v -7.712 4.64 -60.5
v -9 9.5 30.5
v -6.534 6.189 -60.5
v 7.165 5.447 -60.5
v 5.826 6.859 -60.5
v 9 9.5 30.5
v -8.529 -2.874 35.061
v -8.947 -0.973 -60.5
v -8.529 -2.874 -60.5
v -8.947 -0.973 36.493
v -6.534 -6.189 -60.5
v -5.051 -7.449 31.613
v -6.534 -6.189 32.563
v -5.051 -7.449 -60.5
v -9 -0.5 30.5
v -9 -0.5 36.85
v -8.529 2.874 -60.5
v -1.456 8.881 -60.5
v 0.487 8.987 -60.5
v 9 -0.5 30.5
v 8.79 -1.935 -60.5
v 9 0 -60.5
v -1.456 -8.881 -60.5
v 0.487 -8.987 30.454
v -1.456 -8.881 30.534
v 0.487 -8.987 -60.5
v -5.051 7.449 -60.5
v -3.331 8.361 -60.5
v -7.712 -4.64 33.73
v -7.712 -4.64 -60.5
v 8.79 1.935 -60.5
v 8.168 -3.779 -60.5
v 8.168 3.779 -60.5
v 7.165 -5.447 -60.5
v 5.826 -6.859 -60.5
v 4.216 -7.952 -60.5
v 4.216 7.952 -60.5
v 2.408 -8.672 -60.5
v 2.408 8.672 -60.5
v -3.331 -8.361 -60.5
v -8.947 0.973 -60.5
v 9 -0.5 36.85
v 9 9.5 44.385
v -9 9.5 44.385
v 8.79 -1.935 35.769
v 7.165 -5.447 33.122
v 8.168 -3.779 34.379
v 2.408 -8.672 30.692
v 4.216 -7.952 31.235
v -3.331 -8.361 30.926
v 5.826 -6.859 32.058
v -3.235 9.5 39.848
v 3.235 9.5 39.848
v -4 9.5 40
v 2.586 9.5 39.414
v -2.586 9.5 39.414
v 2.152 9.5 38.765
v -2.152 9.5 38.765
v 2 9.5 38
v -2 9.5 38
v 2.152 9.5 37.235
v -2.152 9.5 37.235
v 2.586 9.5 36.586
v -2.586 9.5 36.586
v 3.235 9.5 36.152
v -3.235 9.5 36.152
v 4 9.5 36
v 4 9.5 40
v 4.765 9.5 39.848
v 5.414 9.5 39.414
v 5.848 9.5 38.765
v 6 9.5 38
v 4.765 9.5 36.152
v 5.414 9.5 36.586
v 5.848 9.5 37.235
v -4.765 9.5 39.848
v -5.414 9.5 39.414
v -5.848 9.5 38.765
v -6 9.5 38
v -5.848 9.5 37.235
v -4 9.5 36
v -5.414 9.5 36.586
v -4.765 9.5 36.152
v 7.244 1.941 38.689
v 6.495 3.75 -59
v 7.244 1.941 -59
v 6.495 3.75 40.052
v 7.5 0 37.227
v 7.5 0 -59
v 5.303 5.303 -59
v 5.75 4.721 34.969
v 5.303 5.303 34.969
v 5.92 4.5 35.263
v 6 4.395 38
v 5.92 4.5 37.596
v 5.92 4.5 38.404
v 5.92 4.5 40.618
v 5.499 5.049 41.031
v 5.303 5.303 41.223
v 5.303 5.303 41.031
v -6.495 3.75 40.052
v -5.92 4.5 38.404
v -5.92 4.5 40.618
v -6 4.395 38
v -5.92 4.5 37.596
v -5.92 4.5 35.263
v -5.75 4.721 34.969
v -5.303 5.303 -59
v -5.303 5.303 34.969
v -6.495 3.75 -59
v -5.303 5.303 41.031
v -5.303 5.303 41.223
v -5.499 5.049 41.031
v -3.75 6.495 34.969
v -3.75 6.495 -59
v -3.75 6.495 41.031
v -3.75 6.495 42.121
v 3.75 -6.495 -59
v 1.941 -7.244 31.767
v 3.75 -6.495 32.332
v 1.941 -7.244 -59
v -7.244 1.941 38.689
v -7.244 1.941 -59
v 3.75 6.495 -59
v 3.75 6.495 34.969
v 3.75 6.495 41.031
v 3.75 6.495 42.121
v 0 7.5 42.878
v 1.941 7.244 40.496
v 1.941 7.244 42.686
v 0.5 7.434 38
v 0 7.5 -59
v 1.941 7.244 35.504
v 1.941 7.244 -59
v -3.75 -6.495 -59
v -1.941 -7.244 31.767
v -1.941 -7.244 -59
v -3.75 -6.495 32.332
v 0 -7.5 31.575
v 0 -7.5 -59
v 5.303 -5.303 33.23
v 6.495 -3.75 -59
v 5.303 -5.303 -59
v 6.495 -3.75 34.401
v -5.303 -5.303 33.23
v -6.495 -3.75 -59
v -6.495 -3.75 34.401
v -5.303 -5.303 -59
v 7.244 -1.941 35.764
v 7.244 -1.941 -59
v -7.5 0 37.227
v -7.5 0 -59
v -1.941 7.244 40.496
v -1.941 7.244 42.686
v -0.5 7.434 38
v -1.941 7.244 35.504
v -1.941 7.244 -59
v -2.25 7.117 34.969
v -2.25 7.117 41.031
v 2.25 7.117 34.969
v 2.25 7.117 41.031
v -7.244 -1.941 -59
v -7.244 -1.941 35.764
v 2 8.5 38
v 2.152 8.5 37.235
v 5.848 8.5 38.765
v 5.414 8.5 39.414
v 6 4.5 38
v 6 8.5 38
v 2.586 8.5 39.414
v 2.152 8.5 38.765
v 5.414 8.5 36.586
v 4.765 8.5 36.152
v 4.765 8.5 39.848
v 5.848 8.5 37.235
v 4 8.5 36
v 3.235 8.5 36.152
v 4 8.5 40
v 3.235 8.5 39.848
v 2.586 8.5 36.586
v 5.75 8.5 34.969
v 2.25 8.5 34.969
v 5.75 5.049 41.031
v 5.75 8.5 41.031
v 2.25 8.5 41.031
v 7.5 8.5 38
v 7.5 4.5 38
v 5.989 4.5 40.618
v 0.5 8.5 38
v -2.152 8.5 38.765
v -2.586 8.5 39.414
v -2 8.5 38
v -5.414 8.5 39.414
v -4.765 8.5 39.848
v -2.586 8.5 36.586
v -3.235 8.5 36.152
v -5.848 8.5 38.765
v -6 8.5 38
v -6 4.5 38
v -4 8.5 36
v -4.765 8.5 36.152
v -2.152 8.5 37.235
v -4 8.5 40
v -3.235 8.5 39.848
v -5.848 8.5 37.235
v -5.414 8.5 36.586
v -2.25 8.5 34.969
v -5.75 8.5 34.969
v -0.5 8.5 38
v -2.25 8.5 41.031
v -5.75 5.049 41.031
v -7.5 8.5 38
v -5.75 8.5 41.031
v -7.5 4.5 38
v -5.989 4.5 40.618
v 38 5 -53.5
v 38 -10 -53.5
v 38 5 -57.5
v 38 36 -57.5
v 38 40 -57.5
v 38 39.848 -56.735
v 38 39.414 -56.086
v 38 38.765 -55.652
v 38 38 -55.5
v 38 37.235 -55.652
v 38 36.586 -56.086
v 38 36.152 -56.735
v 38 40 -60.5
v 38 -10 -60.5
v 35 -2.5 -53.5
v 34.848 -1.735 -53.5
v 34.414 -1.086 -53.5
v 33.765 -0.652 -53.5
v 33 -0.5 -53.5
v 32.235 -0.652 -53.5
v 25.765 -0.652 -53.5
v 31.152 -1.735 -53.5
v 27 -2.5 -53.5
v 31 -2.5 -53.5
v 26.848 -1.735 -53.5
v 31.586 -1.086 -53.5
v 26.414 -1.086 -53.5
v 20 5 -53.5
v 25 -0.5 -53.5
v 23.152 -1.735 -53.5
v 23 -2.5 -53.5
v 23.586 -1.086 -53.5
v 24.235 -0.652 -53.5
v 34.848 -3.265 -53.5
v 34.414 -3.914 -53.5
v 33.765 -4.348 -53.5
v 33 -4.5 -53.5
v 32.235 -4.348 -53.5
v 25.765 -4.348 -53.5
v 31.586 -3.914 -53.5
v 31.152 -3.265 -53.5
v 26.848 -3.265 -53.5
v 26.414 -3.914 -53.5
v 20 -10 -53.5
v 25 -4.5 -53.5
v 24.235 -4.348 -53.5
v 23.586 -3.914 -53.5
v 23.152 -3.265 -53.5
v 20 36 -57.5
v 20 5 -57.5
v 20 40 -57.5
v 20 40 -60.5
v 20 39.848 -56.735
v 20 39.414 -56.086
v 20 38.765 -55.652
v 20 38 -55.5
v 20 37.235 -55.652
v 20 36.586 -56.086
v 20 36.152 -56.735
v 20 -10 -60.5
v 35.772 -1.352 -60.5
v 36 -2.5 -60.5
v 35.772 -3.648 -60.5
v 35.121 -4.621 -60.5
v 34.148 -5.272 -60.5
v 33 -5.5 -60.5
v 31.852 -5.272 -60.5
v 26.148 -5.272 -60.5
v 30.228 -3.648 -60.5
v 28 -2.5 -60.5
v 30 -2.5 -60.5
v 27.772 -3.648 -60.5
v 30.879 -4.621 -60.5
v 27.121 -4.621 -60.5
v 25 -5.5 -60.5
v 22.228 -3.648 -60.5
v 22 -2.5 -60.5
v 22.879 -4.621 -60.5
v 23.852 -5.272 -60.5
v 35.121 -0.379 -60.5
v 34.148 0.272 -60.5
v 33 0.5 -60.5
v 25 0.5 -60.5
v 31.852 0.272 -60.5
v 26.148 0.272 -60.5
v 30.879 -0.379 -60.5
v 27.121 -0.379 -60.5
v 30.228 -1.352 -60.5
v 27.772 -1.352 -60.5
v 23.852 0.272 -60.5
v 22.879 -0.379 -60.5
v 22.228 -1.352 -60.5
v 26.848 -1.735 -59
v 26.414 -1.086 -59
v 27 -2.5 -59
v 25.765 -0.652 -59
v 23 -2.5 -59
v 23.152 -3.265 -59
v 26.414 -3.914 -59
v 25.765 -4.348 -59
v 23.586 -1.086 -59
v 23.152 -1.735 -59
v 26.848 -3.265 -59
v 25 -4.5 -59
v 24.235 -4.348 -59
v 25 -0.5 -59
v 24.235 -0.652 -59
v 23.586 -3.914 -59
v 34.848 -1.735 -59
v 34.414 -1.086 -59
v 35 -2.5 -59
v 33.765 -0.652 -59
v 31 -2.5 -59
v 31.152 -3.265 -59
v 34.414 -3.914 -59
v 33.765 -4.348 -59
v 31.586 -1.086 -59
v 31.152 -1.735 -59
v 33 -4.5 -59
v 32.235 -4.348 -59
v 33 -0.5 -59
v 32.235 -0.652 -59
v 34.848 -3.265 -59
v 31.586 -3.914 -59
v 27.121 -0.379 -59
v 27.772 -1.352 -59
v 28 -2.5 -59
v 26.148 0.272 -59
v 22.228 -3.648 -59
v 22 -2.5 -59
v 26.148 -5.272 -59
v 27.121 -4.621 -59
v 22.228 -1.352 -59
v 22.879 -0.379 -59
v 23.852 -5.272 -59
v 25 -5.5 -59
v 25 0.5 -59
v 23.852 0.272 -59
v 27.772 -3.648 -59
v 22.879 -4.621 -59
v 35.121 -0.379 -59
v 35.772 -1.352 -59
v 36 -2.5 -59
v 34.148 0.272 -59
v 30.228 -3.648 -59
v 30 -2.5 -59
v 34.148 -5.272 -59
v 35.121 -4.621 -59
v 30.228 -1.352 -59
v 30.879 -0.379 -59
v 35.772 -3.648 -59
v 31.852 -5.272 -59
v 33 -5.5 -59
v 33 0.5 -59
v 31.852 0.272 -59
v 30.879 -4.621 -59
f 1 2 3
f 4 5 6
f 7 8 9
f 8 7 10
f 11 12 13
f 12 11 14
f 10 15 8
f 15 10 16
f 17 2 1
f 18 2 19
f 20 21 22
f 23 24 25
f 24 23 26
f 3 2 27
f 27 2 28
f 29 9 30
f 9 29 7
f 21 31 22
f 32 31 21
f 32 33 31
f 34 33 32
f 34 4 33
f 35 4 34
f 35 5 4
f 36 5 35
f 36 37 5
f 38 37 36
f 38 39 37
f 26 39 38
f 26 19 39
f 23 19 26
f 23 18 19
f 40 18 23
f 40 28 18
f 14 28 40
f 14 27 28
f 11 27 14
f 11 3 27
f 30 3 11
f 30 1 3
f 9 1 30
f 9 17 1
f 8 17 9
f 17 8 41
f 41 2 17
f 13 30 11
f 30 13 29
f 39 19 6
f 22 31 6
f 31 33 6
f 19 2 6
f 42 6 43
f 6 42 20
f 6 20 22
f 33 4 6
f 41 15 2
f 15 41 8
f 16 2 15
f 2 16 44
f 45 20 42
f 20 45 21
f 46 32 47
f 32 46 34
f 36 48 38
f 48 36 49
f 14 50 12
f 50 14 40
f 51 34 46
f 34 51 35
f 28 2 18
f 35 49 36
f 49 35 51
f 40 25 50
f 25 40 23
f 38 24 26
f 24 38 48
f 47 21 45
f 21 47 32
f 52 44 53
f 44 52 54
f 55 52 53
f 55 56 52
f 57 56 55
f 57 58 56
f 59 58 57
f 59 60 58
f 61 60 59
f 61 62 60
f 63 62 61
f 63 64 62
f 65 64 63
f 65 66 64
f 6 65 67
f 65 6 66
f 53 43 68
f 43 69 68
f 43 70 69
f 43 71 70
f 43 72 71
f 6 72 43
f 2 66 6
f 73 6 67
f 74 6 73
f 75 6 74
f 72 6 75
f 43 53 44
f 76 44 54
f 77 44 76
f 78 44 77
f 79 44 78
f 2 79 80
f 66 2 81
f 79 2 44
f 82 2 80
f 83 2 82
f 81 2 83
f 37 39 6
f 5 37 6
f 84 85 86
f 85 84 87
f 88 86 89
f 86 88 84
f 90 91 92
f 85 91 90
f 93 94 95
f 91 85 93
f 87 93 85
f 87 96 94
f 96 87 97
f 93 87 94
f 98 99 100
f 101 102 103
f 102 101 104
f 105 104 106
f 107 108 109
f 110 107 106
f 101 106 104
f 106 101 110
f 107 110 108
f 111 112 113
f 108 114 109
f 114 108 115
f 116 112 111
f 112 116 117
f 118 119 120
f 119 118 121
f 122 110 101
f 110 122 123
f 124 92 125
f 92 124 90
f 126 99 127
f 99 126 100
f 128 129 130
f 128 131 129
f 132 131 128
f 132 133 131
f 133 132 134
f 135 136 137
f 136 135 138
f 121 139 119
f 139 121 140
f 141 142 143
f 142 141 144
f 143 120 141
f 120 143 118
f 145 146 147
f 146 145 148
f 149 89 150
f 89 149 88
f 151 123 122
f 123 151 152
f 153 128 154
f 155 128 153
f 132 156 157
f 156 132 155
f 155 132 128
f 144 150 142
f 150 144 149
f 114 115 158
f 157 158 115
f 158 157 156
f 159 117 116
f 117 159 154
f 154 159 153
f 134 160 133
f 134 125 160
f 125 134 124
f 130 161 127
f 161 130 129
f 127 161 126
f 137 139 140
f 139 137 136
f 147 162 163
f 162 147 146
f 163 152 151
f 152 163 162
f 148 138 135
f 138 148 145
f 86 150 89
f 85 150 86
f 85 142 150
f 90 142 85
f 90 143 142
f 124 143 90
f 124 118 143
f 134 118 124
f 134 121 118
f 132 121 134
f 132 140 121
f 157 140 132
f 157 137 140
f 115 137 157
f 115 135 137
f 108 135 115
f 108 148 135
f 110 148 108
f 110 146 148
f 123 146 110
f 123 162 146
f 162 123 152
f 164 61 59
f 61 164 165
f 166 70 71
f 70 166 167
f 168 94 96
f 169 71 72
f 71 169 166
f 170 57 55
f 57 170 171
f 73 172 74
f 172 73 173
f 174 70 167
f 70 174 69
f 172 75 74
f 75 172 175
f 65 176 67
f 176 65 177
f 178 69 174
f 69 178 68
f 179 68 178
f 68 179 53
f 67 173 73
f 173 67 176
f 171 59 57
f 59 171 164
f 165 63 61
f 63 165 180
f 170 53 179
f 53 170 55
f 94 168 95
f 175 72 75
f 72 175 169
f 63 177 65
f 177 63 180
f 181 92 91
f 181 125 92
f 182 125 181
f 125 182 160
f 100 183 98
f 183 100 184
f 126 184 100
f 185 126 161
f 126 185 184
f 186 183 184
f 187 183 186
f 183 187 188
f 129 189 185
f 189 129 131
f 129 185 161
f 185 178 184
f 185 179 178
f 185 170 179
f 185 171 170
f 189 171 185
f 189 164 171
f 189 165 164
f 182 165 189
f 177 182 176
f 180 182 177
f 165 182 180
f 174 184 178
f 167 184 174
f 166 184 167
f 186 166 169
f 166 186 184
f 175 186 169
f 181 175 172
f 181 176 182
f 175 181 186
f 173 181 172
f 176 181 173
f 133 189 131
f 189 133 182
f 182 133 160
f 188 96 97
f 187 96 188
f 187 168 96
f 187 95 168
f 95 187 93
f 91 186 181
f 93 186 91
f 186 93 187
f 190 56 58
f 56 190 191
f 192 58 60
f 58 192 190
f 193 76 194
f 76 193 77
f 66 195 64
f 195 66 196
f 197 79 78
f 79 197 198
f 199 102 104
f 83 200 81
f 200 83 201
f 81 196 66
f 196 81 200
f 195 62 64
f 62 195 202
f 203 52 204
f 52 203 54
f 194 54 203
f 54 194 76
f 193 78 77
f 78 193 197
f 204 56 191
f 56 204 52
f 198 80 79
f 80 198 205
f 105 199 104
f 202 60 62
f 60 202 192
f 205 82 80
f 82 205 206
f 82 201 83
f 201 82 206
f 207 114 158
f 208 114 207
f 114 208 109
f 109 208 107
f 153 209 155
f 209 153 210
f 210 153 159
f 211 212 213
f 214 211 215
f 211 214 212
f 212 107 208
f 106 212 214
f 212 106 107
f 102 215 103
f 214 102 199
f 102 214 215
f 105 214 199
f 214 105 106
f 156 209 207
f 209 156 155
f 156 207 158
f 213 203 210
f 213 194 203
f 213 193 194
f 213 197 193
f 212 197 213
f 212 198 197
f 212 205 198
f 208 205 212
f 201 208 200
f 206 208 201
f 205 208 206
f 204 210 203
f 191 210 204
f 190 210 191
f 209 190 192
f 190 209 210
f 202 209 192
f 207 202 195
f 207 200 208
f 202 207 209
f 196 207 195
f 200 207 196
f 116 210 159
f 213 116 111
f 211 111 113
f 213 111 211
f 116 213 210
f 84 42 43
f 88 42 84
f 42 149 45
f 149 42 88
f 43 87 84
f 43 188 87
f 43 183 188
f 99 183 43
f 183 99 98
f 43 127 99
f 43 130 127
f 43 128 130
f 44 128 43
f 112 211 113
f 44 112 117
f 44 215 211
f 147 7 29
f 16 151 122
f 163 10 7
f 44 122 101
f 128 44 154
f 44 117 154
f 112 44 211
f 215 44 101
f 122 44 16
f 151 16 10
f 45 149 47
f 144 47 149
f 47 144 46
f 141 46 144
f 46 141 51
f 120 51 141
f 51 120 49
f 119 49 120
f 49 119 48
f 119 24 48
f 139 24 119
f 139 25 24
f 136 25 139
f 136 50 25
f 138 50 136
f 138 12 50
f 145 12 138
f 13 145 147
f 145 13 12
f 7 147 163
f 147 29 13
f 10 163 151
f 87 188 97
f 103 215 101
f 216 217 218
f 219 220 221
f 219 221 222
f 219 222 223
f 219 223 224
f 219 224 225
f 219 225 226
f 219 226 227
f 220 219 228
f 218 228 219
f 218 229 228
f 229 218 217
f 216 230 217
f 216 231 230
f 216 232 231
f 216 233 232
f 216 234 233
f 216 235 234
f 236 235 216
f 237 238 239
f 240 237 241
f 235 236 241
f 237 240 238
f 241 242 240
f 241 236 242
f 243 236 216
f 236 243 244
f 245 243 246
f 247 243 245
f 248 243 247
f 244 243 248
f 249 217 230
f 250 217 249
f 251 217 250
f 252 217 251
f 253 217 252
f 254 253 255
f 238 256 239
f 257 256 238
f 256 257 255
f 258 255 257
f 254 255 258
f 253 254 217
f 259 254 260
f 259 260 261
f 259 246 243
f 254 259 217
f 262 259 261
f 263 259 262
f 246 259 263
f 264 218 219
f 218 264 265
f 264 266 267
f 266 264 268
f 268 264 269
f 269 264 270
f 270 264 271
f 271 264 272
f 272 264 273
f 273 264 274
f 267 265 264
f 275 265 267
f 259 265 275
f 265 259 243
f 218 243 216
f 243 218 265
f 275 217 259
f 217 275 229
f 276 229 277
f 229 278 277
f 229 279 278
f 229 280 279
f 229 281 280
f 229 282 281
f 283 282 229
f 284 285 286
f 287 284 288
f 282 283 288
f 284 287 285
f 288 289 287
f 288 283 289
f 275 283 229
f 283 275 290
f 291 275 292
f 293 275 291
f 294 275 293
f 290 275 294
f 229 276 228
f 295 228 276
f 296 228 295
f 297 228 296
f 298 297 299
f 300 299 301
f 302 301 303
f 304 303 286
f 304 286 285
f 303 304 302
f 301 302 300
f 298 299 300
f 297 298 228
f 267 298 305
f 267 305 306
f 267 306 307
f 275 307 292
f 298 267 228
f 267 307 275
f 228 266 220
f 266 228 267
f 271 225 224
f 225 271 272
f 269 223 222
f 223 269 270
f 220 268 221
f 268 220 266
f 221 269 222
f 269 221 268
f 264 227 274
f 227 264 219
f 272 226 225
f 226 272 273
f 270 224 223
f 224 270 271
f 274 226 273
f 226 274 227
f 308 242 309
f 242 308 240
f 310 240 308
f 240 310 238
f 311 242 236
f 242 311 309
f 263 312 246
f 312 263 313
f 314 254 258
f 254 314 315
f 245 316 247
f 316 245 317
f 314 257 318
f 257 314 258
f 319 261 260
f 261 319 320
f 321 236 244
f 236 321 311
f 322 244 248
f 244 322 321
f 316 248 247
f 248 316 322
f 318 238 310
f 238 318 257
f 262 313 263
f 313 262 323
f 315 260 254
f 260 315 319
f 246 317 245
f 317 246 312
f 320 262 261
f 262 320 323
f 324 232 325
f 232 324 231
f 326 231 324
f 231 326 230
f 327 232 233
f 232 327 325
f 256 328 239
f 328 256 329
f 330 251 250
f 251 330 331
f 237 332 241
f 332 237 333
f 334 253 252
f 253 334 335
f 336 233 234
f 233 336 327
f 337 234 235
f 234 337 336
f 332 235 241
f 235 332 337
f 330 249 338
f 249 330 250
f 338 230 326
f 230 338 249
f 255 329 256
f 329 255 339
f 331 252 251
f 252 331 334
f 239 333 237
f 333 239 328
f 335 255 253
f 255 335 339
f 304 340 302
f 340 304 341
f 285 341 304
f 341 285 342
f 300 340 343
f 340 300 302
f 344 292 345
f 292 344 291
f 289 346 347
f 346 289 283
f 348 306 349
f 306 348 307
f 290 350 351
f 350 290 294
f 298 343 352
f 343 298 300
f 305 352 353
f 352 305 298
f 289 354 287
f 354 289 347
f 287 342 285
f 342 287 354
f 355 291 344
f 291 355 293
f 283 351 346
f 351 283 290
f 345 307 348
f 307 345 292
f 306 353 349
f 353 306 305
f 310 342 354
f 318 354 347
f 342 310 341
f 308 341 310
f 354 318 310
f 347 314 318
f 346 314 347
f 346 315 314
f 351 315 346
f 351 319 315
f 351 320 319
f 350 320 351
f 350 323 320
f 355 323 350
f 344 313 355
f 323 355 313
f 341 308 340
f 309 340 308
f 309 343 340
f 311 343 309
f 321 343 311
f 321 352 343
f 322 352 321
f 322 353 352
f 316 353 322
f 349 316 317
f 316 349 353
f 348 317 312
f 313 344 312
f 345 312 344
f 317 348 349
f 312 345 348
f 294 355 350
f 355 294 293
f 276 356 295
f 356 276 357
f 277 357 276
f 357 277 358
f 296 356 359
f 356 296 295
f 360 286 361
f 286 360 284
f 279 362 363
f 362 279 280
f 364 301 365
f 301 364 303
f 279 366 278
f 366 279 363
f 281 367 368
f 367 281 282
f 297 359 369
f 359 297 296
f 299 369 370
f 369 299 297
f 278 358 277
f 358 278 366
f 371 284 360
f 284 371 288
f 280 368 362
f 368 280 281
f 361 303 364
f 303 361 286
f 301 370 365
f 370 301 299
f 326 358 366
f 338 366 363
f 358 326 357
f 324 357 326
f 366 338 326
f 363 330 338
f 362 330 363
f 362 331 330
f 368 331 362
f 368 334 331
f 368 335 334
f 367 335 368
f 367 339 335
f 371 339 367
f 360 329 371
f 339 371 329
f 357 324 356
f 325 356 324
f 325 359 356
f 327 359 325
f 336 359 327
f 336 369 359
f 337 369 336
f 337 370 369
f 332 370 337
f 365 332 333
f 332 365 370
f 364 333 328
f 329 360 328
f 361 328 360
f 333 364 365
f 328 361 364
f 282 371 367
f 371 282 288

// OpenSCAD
//Length of the clip
clip_length = 50;
//inner length of sheath, length of accu from knob downwards
inner_length = 90;
//inner Diameter, Diameter of accu + some tolerance
inner_dia = 15;
// which part should be rendered?
part = "plate"; //[assy:Assembly,sheath:Sheath only,clip:Clip only,plate:Both parts for printing]

module print_part()
{
if(part=="assy"){
assembly();
}else if(part=="sheath"){
sheath();
}else if(part=="clip"){
clip();
}else if(part=="plate"){
plate();
}
}
module sheath()
{
difference()
{
hull()
{
translate([0,0,-inner_length/2+37.5])
cylinder(r=inner_dia/2+1.5,h=inner_length+16,center=true);
translate([0,inner_dia/2-3,38])
cube([inner_dia+3,10,15],center=true);
}
translate([0,0,-inner_length/2+46.5])
cylinder(r=inner_dia/2,h=inner_length+31,center=true);

translate([4,inner_dia/2,38])
rotate([90,0,0])
cylinder(r=2,h=7,center=true,$fn=16);

translate([4,inner_dia/2-1,38])
rotate([90,0,0])
cylinder(r=3.5,h=4,center=true,$fn=6);

translate([-4,inner_dia/2,38])
rotate([90,0,0])
cylinder(r=2,h=7,center=true,$fn=16);

translate([-4,inner_dia/2-1,38])
rotate([90,0,0])
cylinder(r=3.5,h=4,center=true,$fn=6);

translate([0,0,51])
rotate([37,0,0])
cube([inner_dia*2,inner_dia*3,22],center=true);
}
}

module clip()
{
difference()
{
union()
{
cube([18,15,4],center=false);
translate([0,0,-3])
cube([18,clip_length,3],center=false);
translate([0,clip_length-2,0])
rotate([0,90,0])
cylinder(r=2,h=18,$fn=16);
}
translate([5,7.5,0])
cylinder(r=2,h=15,center=true,$fn=16);
translate([13,7.5,0])
cylinder(r=2,h=15,center=true,$fn=16);

translate([5,7.5,-2.5])
cylinder(r=3,h=2,center=true,$fn=16);
translate([13,7.5,-2.5])
cylinder(r=3,h=2,center=true,$fn=16);
}
}
module plate()
{
sheath();
translate([20,-10,-inner_length+32.5])
clip();
}
module assembly()
{
sheath();
translate([9,17,45.5])
rotate([90,180,0])
clip();
}

print_part();
